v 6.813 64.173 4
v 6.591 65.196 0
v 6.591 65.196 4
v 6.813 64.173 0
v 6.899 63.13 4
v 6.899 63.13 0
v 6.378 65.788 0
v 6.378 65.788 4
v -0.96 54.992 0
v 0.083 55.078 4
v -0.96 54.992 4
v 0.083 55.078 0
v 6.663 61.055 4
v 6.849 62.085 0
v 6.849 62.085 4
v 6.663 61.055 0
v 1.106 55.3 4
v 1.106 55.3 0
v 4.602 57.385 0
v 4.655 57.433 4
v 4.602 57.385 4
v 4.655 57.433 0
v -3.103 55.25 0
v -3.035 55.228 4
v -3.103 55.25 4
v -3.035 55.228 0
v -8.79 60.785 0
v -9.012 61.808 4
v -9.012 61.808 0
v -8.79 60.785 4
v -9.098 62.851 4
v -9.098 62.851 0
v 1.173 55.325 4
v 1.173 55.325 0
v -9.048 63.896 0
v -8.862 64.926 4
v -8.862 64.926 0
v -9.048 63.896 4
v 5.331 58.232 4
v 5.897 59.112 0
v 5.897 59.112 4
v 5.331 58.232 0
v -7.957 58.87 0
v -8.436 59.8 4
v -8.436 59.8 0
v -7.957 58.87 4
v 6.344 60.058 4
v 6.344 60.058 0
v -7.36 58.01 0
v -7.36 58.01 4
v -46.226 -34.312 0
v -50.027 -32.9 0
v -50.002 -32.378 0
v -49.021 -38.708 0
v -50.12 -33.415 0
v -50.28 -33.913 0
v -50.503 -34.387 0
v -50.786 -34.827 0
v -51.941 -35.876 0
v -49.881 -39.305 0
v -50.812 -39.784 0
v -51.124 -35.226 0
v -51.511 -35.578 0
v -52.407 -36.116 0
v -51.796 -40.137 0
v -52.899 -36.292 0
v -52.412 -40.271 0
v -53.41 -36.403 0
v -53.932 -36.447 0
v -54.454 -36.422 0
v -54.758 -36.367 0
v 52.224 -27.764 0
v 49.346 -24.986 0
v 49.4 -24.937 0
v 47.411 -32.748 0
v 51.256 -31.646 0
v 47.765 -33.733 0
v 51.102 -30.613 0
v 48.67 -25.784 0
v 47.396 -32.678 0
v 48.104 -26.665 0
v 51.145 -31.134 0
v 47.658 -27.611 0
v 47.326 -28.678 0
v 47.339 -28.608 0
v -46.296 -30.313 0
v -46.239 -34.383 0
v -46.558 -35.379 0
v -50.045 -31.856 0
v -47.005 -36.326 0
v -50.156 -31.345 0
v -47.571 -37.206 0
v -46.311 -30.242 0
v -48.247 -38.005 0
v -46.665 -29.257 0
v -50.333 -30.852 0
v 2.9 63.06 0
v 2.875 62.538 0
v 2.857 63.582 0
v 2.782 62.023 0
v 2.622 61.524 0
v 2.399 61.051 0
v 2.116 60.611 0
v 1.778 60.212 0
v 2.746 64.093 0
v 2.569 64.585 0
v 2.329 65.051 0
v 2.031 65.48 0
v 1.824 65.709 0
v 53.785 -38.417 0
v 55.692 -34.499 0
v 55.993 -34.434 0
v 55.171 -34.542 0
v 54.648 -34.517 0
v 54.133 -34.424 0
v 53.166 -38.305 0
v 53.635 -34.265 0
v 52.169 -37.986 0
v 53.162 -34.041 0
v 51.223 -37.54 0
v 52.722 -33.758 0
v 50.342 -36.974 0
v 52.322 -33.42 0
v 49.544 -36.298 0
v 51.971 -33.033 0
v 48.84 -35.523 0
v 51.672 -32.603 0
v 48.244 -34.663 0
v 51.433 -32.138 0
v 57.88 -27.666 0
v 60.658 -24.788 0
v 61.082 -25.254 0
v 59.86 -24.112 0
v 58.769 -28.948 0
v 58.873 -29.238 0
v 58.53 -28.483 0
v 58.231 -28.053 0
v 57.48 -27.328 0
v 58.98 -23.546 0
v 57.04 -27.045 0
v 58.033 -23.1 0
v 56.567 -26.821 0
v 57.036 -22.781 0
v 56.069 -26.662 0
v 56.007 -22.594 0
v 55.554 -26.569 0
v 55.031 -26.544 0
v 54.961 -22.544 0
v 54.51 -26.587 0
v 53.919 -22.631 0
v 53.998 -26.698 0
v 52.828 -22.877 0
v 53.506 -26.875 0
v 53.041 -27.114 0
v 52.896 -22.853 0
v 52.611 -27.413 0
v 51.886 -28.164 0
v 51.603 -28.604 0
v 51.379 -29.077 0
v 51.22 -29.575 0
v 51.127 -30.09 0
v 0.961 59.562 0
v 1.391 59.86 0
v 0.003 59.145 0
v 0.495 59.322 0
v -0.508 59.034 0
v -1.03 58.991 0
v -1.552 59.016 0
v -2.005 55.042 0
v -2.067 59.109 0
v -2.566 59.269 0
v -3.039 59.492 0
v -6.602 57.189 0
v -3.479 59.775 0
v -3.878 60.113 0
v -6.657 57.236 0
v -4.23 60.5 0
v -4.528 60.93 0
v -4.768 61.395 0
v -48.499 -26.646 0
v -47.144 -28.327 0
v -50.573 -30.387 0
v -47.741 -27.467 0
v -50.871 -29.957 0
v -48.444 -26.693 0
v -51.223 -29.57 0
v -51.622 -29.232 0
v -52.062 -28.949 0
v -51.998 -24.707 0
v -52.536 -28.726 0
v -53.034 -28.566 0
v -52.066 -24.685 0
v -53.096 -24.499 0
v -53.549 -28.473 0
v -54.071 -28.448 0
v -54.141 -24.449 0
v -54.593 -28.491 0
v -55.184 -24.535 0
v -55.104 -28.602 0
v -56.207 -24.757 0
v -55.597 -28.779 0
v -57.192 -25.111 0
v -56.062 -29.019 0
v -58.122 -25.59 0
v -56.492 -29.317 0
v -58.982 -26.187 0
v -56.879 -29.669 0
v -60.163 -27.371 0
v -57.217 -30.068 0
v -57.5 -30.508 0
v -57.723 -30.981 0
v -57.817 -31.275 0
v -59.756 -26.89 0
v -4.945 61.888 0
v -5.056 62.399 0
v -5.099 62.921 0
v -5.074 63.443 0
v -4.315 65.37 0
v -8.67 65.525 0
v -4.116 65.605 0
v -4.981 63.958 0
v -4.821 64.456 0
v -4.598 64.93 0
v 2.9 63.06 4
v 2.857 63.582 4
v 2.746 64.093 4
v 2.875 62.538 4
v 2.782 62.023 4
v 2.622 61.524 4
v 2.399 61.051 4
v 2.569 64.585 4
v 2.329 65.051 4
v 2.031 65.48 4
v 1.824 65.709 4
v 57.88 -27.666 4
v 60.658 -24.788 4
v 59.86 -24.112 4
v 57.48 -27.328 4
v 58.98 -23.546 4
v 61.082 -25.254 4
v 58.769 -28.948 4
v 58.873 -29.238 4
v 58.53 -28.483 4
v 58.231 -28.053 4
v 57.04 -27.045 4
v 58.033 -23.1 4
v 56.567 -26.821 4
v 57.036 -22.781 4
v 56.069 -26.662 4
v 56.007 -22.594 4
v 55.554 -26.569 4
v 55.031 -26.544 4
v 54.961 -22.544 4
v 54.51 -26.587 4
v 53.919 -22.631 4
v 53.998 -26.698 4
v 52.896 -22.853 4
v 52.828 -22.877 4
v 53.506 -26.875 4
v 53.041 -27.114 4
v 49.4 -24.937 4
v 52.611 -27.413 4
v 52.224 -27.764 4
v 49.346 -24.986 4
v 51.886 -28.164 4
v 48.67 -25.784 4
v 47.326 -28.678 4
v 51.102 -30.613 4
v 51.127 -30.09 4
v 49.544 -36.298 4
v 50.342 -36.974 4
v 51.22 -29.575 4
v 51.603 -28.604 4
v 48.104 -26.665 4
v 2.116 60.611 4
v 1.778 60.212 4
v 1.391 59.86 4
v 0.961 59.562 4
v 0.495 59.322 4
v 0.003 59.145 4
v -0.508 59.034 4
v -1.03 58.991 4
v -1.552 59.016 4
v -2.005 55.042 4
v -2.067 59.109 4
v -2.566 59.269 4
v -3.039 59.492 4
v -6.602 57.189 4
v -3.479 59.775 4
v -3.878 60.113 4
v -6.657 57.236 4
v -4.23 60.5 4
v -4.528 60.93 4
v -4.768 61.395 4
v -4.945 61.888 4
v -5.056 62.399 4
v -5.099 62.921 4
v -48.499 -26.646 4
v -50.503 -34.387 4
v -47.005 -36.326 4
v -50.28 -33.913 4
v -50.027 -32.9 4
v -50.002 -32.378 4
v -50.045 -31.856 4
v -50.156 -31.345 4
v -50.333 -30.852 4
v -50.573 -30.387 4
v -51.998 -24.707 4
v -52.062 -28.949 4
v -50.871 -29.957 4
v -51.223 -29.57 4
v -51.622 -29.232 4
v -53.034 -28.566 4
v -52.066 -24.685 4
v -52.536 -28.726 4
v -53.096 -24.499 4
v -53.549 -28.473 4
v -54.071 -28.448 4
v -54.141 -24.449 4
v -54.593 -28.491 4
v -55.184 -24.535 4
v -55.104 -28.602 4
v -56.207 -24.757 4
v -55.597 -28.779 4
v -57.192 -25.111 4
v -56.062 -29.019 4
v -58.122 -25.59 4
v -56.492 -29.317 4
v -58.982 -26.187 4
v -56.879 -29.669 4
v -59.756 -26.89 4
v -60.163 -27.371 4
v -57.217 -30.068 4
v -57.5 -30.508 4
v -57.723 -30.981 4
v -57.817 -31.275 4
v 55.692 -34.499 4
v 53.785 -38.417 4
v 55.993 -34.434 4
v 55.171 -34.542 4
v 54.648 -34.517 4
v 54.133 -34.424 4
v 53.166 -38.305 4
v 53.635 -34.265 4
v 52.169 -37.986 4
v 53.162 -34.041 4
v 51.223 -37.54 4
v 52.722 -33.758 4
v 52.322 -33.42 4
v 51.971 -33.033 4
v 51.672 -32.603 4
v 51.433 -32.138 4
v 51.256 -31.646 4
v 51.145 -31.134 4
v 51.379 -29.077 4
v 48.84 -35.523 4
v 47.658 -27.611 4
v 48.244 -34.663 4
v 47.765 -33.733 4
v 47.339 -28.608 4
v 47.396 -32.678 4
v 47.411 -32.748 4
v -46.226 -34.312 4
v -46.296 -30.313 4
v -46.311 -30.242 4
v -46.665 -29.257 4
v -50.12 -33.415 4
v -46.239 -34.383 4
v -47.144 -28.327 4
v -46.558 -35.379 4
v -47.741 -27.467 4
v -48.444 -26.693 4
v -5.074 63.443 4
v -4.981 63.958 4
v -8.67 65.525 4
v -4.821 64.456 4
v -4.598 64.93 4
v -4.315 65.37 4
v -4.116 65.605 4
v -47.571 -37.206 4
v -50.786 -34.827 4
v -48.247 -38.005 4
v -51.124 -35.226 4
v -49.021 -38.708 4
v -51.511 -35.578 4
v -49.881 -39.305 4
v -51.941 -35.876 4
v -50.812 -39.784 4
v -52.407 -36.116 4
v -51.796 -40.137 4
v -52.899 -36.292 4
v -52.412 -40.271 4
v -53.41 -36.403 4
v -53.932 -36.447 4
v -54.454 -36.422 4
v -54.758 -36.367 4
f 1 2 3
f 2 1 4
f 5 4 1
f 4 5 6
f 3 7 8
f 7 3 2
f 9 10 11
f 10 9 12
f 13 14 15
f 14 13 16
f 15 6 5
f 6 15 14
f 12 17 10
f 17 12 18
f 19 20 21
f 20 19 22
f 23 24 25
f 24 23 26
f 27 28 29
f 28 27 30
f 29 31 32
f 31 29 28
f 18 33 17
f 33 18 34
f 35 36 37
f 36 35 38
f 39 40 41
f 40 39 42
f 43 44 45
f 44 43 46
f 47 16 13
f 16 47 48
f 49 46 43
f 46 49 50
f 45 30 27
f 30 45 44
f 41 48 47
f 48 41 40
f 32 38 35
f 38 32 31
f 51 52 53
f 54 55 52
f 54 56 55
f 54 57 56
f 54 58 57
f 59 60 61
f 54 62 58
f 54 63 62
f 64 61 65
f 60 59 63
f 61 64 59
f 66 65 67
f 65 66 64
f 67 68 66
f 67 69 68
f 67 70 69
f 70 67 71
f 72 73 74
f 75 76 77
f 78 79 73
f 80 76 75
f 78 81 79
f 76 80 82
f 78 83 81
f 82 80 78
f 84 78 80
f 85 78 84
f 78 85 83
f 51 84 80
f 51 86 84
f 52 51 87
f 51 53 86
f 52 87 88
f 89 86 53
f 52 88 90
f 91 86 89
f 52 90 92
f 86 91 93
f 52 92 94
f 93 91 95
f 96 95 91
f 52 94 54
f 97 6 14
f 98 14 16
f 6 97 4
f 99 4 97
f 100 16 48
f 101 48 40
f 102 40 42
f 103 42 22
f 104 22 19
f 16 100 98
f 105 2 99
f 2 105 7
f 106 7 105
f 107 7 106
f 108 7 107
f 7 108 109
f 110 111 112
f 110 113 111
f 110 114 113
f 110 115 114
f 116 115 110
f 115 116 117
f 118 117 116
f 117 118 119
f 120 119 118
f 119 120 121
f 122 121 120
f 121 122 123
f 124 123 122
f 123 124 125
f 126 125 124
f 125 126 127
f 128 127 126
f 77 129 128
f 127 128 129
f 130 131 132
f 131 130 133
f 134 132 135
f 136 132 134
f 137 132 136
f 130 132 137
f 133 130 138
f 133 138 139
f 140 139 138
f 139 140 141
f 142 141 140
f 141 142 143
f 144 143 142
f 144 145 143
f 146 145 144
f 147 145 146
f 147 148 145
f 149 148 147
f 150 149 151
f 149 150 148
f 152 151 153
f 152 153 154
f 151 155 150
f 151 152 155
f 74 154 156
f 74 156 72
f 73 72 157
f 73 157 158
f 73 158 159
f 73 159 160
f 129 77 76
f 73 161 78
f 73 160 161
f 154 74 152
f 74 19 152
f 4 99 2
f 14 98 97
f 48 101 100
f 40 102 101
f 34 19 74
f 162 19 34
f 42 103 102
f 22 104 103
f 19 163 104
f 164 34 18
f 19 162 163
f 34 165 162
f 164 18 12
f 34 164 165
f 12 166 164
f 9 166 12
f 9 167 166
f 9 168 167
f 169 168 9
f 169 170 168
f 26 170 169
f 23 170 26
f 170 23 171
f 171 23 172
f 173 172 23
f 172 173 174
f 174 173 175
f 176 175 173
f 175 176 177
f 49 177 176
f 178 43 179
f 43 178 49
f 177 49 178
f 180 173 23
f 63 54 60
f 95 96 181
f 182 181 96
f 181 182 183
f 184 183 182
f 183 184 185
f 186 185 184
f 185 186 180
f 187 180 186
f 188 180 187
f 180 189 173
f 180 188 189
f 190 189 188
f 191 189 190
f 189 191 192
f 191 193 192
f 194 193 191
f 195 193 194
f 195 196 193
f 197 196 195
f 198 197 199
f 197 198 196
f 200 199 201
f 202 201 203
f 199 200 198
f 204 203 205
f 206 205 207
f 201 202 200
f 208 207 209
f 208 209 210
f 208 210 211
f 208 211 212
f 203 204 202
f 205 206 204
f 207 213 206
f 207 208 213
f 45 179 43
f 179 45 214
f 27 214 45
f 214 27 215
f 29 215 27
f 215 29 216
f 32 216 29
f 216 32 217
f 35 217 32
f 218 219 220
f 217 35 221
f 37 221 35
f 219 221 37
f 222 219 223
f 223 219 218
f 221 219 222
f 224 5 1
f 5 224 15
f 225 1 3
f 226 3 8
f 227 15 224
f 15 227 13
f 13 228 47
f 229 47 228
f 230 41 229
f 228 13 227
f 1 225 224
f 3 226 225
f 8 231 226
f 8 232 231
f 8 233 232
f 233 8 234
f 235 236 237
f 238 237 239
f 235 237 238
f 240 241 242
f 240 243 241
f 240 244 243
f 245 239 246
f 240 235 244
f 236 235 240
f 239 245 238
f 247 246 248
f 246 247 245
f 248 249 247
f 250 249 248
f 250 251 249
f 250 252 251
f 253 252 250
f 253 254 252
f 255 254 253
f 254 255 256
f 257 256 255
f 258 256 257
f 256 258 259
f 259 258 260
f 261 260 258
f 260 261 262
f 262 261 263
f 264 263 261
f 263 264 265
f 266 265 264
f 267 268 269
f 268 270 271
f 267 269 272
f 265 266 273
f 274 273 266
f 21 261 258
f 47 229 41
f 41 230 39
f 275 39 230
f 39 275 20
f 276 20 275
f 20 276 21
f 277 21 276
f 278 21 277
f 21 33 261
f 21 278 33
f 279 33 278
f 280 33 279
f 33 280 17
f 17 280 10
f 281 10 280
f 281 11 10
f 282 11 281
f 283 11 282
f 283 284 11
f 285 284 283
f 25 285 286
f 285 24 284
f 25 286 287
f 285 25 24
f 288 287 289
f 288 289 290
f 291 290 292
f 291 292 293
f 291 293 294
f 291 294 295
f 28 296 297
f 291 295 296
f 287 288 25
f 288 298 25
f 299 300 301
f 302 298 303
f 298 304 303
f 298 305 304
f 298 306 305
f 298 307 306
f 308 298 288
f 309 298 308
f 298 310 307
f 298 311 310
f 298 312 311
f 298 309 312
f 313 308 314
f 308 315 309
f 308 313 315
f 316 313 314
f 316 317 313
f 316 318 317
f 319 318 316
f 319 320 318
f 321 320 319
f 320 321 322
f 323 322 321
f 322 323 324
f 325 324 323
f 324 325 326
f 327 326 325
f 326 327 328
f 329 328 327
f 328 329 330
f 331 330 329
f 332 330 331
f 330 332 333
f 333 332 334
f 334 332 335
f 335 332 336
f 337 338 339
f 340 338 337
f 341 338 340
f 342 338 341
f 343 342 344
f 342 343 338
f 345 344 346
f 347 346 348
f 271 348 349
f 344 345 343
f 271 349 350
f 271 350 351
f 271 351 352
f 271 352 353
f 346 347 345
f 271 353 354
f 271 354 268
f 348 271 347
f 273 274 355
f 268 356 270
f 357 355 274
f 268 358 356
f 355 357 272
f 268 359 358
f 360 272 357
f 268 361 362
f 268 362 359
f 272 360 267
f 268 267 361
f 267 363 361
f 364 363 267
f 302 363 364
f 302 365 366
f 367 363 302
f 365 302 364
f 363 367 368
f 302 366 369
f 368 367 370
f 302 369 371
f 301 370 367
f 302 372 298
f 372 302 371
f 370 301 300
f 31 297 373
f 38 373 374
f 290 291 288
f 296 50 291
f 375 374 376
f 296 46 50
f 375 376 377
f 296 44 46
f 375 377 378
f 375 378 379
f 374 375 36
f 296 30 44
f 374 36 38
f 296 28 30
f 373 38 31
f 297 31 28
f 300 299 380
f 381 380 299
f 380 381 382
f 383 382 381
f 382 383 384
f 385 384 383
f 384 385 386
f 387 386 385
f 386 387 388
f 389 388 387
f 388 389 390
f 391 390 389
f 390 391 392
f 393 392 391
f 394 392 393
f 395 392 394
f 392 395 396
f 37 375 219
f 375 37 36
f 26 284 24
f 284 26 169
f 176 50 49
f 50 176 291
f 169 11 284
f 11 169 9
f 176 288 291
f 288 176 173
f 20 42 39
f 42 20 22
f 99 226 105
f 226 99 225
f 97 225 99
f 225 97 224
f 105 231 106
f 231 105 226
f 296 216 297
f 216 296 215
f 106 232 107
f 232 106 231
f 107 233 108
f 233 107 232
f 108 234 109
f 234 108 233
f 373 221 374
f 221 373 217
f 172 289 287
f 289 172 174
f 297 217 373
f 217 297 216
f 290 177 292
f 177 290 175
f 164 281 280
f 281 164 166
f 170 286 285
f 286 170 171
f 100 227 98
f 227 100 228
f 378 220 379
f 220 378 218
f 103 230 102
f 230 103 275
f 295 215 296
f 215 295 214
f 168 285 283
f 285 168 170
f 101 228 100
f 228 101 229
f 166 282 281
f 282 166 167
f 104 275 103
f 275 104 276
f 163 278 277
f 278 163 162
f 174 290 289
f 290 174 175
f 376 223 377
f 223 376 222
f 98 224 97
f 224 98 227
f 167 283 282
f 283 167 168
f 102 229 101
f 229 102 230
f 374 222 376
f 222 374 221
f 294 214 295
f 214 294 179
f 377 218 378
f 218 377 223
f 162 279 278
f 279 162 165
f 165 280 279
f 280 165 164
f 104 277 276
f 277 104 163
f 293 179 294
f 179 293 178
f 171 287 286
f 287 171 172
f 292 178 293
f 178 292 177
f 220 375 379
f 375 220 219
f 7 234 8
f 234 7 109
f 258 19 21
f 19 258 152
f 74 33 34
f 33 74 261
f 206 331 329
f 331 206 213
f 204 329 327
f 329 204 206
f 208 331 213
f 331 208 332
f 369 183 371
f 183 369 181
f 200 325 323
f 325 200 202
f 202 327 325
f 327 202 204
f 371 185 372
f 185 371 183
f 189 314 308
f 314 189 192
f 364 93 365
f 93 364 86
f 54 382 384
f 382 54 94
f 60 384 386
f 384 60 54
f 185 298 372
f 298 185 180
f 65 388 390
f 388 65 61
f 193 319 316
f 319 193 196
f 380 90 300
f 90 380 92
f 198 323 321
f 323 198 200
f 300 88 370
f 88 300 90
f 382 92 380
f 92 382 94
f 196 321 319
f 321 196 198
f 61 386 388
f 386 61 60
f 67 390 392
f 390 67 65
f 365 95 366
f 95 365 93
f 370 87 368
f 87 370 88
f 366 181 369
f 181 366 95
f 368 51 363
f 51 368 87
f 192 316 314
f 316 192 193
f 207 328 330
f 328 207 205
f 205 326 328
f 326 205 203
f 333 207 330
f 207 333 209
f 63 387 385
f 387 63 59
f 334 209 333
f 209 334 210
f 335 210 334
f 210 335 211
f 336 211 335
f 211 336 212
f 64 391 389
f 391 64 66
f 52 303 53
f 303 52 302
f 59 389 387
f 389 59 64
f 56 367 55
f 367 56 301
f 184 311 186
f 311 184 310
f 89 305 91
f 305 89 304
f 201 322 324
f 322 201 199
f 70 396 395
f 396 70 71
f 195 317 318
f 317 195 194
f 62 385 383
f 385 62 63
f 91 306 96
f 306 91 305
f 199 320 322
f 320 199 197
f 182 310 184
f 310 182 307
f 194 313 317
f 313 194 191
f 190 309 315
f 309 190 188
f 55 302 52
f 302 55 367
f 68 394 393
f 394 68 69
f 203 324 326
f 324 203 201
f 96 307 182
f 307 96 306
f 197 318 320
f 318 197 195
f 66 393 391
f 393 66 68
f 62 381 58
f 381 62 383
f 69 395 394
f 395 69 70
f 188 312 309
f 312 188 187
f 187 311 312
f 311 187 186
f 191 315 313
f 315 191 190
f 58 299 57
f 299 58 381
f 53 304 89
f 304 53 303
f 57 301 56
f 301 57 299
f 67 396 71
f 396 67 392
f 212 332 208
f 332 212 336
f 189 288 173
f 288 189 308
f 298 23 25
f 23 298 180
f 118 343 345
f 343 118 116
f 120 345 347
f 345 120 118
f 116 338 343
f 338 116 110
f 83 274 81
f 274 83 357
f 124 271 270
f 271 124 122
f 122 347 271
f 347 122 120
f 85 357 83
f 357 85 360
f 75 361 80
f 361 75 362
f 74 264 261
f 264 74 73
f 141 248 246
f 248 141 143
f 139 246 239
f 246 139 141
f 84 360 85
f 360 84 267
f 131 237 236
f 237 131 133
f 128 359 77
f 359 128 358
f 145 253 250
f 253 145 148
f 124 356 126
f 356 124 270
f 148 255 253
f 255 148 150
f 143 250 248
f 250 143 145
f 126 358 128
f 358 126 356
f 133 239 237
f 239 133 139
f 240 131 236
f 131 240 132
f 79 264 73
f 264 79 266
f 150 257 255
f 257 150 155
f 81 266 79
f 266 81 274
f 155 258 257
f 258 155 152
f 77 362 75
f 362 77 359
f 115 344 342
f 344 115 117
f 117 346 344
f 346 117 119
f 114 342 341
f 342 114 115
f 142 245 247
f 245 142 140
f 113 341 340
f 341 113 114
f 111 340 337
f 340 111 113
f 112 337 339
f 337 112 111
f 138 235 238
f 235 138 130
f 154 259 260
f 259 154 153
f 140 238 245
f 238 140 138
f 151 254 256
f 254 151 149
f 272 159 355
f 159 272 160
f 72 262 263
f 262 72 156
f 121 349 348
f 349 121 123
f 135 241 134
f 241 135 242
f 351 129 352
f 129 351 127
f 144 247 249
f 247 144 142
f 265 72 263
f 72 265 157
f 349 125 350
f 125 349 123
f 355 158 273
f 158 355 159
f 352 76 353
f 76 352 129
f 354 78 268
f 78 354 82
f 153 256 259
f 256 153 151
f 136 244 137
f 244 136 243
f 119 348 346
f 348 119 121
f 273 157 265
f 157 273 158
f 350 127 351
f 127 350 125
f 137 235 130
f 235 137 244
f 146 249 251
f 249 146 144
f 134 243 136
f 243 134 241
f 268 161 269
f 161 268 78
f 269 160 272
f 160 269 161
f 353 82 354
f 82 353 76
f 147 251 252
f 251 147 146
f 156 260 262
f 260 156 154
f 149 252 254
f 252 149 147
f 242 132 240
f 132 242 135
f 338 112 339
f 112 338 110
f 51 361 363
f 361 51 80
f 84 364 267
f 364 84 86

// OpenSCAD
$fn=48;
diam=8;
wall=8;
height=4;
length=100;
foo=63;
clips();
module clips() {
	for(i=[1:360/3:360]) {
		rotate([0,0,i])
				clip();
	}
}
module clip() {
	translate([0,foo,0]) {
		difference() {
			cylinder(d=diam+wall,h=height);
			translate([0,0,-wall/2])
				cylinder(d=diam,h=height+wall);
			translate([0,(diam+wall)/2+diam/3,height/2])
				cube([diam+wall,diam+wall,height*2], center=true);
			}
		bar();
	};
}
module bar() {
	rotate([0,0,30])
	translate([0,-length/2-diam/2,height/2])
		cube([wall/2,length,height], center=true);
}
